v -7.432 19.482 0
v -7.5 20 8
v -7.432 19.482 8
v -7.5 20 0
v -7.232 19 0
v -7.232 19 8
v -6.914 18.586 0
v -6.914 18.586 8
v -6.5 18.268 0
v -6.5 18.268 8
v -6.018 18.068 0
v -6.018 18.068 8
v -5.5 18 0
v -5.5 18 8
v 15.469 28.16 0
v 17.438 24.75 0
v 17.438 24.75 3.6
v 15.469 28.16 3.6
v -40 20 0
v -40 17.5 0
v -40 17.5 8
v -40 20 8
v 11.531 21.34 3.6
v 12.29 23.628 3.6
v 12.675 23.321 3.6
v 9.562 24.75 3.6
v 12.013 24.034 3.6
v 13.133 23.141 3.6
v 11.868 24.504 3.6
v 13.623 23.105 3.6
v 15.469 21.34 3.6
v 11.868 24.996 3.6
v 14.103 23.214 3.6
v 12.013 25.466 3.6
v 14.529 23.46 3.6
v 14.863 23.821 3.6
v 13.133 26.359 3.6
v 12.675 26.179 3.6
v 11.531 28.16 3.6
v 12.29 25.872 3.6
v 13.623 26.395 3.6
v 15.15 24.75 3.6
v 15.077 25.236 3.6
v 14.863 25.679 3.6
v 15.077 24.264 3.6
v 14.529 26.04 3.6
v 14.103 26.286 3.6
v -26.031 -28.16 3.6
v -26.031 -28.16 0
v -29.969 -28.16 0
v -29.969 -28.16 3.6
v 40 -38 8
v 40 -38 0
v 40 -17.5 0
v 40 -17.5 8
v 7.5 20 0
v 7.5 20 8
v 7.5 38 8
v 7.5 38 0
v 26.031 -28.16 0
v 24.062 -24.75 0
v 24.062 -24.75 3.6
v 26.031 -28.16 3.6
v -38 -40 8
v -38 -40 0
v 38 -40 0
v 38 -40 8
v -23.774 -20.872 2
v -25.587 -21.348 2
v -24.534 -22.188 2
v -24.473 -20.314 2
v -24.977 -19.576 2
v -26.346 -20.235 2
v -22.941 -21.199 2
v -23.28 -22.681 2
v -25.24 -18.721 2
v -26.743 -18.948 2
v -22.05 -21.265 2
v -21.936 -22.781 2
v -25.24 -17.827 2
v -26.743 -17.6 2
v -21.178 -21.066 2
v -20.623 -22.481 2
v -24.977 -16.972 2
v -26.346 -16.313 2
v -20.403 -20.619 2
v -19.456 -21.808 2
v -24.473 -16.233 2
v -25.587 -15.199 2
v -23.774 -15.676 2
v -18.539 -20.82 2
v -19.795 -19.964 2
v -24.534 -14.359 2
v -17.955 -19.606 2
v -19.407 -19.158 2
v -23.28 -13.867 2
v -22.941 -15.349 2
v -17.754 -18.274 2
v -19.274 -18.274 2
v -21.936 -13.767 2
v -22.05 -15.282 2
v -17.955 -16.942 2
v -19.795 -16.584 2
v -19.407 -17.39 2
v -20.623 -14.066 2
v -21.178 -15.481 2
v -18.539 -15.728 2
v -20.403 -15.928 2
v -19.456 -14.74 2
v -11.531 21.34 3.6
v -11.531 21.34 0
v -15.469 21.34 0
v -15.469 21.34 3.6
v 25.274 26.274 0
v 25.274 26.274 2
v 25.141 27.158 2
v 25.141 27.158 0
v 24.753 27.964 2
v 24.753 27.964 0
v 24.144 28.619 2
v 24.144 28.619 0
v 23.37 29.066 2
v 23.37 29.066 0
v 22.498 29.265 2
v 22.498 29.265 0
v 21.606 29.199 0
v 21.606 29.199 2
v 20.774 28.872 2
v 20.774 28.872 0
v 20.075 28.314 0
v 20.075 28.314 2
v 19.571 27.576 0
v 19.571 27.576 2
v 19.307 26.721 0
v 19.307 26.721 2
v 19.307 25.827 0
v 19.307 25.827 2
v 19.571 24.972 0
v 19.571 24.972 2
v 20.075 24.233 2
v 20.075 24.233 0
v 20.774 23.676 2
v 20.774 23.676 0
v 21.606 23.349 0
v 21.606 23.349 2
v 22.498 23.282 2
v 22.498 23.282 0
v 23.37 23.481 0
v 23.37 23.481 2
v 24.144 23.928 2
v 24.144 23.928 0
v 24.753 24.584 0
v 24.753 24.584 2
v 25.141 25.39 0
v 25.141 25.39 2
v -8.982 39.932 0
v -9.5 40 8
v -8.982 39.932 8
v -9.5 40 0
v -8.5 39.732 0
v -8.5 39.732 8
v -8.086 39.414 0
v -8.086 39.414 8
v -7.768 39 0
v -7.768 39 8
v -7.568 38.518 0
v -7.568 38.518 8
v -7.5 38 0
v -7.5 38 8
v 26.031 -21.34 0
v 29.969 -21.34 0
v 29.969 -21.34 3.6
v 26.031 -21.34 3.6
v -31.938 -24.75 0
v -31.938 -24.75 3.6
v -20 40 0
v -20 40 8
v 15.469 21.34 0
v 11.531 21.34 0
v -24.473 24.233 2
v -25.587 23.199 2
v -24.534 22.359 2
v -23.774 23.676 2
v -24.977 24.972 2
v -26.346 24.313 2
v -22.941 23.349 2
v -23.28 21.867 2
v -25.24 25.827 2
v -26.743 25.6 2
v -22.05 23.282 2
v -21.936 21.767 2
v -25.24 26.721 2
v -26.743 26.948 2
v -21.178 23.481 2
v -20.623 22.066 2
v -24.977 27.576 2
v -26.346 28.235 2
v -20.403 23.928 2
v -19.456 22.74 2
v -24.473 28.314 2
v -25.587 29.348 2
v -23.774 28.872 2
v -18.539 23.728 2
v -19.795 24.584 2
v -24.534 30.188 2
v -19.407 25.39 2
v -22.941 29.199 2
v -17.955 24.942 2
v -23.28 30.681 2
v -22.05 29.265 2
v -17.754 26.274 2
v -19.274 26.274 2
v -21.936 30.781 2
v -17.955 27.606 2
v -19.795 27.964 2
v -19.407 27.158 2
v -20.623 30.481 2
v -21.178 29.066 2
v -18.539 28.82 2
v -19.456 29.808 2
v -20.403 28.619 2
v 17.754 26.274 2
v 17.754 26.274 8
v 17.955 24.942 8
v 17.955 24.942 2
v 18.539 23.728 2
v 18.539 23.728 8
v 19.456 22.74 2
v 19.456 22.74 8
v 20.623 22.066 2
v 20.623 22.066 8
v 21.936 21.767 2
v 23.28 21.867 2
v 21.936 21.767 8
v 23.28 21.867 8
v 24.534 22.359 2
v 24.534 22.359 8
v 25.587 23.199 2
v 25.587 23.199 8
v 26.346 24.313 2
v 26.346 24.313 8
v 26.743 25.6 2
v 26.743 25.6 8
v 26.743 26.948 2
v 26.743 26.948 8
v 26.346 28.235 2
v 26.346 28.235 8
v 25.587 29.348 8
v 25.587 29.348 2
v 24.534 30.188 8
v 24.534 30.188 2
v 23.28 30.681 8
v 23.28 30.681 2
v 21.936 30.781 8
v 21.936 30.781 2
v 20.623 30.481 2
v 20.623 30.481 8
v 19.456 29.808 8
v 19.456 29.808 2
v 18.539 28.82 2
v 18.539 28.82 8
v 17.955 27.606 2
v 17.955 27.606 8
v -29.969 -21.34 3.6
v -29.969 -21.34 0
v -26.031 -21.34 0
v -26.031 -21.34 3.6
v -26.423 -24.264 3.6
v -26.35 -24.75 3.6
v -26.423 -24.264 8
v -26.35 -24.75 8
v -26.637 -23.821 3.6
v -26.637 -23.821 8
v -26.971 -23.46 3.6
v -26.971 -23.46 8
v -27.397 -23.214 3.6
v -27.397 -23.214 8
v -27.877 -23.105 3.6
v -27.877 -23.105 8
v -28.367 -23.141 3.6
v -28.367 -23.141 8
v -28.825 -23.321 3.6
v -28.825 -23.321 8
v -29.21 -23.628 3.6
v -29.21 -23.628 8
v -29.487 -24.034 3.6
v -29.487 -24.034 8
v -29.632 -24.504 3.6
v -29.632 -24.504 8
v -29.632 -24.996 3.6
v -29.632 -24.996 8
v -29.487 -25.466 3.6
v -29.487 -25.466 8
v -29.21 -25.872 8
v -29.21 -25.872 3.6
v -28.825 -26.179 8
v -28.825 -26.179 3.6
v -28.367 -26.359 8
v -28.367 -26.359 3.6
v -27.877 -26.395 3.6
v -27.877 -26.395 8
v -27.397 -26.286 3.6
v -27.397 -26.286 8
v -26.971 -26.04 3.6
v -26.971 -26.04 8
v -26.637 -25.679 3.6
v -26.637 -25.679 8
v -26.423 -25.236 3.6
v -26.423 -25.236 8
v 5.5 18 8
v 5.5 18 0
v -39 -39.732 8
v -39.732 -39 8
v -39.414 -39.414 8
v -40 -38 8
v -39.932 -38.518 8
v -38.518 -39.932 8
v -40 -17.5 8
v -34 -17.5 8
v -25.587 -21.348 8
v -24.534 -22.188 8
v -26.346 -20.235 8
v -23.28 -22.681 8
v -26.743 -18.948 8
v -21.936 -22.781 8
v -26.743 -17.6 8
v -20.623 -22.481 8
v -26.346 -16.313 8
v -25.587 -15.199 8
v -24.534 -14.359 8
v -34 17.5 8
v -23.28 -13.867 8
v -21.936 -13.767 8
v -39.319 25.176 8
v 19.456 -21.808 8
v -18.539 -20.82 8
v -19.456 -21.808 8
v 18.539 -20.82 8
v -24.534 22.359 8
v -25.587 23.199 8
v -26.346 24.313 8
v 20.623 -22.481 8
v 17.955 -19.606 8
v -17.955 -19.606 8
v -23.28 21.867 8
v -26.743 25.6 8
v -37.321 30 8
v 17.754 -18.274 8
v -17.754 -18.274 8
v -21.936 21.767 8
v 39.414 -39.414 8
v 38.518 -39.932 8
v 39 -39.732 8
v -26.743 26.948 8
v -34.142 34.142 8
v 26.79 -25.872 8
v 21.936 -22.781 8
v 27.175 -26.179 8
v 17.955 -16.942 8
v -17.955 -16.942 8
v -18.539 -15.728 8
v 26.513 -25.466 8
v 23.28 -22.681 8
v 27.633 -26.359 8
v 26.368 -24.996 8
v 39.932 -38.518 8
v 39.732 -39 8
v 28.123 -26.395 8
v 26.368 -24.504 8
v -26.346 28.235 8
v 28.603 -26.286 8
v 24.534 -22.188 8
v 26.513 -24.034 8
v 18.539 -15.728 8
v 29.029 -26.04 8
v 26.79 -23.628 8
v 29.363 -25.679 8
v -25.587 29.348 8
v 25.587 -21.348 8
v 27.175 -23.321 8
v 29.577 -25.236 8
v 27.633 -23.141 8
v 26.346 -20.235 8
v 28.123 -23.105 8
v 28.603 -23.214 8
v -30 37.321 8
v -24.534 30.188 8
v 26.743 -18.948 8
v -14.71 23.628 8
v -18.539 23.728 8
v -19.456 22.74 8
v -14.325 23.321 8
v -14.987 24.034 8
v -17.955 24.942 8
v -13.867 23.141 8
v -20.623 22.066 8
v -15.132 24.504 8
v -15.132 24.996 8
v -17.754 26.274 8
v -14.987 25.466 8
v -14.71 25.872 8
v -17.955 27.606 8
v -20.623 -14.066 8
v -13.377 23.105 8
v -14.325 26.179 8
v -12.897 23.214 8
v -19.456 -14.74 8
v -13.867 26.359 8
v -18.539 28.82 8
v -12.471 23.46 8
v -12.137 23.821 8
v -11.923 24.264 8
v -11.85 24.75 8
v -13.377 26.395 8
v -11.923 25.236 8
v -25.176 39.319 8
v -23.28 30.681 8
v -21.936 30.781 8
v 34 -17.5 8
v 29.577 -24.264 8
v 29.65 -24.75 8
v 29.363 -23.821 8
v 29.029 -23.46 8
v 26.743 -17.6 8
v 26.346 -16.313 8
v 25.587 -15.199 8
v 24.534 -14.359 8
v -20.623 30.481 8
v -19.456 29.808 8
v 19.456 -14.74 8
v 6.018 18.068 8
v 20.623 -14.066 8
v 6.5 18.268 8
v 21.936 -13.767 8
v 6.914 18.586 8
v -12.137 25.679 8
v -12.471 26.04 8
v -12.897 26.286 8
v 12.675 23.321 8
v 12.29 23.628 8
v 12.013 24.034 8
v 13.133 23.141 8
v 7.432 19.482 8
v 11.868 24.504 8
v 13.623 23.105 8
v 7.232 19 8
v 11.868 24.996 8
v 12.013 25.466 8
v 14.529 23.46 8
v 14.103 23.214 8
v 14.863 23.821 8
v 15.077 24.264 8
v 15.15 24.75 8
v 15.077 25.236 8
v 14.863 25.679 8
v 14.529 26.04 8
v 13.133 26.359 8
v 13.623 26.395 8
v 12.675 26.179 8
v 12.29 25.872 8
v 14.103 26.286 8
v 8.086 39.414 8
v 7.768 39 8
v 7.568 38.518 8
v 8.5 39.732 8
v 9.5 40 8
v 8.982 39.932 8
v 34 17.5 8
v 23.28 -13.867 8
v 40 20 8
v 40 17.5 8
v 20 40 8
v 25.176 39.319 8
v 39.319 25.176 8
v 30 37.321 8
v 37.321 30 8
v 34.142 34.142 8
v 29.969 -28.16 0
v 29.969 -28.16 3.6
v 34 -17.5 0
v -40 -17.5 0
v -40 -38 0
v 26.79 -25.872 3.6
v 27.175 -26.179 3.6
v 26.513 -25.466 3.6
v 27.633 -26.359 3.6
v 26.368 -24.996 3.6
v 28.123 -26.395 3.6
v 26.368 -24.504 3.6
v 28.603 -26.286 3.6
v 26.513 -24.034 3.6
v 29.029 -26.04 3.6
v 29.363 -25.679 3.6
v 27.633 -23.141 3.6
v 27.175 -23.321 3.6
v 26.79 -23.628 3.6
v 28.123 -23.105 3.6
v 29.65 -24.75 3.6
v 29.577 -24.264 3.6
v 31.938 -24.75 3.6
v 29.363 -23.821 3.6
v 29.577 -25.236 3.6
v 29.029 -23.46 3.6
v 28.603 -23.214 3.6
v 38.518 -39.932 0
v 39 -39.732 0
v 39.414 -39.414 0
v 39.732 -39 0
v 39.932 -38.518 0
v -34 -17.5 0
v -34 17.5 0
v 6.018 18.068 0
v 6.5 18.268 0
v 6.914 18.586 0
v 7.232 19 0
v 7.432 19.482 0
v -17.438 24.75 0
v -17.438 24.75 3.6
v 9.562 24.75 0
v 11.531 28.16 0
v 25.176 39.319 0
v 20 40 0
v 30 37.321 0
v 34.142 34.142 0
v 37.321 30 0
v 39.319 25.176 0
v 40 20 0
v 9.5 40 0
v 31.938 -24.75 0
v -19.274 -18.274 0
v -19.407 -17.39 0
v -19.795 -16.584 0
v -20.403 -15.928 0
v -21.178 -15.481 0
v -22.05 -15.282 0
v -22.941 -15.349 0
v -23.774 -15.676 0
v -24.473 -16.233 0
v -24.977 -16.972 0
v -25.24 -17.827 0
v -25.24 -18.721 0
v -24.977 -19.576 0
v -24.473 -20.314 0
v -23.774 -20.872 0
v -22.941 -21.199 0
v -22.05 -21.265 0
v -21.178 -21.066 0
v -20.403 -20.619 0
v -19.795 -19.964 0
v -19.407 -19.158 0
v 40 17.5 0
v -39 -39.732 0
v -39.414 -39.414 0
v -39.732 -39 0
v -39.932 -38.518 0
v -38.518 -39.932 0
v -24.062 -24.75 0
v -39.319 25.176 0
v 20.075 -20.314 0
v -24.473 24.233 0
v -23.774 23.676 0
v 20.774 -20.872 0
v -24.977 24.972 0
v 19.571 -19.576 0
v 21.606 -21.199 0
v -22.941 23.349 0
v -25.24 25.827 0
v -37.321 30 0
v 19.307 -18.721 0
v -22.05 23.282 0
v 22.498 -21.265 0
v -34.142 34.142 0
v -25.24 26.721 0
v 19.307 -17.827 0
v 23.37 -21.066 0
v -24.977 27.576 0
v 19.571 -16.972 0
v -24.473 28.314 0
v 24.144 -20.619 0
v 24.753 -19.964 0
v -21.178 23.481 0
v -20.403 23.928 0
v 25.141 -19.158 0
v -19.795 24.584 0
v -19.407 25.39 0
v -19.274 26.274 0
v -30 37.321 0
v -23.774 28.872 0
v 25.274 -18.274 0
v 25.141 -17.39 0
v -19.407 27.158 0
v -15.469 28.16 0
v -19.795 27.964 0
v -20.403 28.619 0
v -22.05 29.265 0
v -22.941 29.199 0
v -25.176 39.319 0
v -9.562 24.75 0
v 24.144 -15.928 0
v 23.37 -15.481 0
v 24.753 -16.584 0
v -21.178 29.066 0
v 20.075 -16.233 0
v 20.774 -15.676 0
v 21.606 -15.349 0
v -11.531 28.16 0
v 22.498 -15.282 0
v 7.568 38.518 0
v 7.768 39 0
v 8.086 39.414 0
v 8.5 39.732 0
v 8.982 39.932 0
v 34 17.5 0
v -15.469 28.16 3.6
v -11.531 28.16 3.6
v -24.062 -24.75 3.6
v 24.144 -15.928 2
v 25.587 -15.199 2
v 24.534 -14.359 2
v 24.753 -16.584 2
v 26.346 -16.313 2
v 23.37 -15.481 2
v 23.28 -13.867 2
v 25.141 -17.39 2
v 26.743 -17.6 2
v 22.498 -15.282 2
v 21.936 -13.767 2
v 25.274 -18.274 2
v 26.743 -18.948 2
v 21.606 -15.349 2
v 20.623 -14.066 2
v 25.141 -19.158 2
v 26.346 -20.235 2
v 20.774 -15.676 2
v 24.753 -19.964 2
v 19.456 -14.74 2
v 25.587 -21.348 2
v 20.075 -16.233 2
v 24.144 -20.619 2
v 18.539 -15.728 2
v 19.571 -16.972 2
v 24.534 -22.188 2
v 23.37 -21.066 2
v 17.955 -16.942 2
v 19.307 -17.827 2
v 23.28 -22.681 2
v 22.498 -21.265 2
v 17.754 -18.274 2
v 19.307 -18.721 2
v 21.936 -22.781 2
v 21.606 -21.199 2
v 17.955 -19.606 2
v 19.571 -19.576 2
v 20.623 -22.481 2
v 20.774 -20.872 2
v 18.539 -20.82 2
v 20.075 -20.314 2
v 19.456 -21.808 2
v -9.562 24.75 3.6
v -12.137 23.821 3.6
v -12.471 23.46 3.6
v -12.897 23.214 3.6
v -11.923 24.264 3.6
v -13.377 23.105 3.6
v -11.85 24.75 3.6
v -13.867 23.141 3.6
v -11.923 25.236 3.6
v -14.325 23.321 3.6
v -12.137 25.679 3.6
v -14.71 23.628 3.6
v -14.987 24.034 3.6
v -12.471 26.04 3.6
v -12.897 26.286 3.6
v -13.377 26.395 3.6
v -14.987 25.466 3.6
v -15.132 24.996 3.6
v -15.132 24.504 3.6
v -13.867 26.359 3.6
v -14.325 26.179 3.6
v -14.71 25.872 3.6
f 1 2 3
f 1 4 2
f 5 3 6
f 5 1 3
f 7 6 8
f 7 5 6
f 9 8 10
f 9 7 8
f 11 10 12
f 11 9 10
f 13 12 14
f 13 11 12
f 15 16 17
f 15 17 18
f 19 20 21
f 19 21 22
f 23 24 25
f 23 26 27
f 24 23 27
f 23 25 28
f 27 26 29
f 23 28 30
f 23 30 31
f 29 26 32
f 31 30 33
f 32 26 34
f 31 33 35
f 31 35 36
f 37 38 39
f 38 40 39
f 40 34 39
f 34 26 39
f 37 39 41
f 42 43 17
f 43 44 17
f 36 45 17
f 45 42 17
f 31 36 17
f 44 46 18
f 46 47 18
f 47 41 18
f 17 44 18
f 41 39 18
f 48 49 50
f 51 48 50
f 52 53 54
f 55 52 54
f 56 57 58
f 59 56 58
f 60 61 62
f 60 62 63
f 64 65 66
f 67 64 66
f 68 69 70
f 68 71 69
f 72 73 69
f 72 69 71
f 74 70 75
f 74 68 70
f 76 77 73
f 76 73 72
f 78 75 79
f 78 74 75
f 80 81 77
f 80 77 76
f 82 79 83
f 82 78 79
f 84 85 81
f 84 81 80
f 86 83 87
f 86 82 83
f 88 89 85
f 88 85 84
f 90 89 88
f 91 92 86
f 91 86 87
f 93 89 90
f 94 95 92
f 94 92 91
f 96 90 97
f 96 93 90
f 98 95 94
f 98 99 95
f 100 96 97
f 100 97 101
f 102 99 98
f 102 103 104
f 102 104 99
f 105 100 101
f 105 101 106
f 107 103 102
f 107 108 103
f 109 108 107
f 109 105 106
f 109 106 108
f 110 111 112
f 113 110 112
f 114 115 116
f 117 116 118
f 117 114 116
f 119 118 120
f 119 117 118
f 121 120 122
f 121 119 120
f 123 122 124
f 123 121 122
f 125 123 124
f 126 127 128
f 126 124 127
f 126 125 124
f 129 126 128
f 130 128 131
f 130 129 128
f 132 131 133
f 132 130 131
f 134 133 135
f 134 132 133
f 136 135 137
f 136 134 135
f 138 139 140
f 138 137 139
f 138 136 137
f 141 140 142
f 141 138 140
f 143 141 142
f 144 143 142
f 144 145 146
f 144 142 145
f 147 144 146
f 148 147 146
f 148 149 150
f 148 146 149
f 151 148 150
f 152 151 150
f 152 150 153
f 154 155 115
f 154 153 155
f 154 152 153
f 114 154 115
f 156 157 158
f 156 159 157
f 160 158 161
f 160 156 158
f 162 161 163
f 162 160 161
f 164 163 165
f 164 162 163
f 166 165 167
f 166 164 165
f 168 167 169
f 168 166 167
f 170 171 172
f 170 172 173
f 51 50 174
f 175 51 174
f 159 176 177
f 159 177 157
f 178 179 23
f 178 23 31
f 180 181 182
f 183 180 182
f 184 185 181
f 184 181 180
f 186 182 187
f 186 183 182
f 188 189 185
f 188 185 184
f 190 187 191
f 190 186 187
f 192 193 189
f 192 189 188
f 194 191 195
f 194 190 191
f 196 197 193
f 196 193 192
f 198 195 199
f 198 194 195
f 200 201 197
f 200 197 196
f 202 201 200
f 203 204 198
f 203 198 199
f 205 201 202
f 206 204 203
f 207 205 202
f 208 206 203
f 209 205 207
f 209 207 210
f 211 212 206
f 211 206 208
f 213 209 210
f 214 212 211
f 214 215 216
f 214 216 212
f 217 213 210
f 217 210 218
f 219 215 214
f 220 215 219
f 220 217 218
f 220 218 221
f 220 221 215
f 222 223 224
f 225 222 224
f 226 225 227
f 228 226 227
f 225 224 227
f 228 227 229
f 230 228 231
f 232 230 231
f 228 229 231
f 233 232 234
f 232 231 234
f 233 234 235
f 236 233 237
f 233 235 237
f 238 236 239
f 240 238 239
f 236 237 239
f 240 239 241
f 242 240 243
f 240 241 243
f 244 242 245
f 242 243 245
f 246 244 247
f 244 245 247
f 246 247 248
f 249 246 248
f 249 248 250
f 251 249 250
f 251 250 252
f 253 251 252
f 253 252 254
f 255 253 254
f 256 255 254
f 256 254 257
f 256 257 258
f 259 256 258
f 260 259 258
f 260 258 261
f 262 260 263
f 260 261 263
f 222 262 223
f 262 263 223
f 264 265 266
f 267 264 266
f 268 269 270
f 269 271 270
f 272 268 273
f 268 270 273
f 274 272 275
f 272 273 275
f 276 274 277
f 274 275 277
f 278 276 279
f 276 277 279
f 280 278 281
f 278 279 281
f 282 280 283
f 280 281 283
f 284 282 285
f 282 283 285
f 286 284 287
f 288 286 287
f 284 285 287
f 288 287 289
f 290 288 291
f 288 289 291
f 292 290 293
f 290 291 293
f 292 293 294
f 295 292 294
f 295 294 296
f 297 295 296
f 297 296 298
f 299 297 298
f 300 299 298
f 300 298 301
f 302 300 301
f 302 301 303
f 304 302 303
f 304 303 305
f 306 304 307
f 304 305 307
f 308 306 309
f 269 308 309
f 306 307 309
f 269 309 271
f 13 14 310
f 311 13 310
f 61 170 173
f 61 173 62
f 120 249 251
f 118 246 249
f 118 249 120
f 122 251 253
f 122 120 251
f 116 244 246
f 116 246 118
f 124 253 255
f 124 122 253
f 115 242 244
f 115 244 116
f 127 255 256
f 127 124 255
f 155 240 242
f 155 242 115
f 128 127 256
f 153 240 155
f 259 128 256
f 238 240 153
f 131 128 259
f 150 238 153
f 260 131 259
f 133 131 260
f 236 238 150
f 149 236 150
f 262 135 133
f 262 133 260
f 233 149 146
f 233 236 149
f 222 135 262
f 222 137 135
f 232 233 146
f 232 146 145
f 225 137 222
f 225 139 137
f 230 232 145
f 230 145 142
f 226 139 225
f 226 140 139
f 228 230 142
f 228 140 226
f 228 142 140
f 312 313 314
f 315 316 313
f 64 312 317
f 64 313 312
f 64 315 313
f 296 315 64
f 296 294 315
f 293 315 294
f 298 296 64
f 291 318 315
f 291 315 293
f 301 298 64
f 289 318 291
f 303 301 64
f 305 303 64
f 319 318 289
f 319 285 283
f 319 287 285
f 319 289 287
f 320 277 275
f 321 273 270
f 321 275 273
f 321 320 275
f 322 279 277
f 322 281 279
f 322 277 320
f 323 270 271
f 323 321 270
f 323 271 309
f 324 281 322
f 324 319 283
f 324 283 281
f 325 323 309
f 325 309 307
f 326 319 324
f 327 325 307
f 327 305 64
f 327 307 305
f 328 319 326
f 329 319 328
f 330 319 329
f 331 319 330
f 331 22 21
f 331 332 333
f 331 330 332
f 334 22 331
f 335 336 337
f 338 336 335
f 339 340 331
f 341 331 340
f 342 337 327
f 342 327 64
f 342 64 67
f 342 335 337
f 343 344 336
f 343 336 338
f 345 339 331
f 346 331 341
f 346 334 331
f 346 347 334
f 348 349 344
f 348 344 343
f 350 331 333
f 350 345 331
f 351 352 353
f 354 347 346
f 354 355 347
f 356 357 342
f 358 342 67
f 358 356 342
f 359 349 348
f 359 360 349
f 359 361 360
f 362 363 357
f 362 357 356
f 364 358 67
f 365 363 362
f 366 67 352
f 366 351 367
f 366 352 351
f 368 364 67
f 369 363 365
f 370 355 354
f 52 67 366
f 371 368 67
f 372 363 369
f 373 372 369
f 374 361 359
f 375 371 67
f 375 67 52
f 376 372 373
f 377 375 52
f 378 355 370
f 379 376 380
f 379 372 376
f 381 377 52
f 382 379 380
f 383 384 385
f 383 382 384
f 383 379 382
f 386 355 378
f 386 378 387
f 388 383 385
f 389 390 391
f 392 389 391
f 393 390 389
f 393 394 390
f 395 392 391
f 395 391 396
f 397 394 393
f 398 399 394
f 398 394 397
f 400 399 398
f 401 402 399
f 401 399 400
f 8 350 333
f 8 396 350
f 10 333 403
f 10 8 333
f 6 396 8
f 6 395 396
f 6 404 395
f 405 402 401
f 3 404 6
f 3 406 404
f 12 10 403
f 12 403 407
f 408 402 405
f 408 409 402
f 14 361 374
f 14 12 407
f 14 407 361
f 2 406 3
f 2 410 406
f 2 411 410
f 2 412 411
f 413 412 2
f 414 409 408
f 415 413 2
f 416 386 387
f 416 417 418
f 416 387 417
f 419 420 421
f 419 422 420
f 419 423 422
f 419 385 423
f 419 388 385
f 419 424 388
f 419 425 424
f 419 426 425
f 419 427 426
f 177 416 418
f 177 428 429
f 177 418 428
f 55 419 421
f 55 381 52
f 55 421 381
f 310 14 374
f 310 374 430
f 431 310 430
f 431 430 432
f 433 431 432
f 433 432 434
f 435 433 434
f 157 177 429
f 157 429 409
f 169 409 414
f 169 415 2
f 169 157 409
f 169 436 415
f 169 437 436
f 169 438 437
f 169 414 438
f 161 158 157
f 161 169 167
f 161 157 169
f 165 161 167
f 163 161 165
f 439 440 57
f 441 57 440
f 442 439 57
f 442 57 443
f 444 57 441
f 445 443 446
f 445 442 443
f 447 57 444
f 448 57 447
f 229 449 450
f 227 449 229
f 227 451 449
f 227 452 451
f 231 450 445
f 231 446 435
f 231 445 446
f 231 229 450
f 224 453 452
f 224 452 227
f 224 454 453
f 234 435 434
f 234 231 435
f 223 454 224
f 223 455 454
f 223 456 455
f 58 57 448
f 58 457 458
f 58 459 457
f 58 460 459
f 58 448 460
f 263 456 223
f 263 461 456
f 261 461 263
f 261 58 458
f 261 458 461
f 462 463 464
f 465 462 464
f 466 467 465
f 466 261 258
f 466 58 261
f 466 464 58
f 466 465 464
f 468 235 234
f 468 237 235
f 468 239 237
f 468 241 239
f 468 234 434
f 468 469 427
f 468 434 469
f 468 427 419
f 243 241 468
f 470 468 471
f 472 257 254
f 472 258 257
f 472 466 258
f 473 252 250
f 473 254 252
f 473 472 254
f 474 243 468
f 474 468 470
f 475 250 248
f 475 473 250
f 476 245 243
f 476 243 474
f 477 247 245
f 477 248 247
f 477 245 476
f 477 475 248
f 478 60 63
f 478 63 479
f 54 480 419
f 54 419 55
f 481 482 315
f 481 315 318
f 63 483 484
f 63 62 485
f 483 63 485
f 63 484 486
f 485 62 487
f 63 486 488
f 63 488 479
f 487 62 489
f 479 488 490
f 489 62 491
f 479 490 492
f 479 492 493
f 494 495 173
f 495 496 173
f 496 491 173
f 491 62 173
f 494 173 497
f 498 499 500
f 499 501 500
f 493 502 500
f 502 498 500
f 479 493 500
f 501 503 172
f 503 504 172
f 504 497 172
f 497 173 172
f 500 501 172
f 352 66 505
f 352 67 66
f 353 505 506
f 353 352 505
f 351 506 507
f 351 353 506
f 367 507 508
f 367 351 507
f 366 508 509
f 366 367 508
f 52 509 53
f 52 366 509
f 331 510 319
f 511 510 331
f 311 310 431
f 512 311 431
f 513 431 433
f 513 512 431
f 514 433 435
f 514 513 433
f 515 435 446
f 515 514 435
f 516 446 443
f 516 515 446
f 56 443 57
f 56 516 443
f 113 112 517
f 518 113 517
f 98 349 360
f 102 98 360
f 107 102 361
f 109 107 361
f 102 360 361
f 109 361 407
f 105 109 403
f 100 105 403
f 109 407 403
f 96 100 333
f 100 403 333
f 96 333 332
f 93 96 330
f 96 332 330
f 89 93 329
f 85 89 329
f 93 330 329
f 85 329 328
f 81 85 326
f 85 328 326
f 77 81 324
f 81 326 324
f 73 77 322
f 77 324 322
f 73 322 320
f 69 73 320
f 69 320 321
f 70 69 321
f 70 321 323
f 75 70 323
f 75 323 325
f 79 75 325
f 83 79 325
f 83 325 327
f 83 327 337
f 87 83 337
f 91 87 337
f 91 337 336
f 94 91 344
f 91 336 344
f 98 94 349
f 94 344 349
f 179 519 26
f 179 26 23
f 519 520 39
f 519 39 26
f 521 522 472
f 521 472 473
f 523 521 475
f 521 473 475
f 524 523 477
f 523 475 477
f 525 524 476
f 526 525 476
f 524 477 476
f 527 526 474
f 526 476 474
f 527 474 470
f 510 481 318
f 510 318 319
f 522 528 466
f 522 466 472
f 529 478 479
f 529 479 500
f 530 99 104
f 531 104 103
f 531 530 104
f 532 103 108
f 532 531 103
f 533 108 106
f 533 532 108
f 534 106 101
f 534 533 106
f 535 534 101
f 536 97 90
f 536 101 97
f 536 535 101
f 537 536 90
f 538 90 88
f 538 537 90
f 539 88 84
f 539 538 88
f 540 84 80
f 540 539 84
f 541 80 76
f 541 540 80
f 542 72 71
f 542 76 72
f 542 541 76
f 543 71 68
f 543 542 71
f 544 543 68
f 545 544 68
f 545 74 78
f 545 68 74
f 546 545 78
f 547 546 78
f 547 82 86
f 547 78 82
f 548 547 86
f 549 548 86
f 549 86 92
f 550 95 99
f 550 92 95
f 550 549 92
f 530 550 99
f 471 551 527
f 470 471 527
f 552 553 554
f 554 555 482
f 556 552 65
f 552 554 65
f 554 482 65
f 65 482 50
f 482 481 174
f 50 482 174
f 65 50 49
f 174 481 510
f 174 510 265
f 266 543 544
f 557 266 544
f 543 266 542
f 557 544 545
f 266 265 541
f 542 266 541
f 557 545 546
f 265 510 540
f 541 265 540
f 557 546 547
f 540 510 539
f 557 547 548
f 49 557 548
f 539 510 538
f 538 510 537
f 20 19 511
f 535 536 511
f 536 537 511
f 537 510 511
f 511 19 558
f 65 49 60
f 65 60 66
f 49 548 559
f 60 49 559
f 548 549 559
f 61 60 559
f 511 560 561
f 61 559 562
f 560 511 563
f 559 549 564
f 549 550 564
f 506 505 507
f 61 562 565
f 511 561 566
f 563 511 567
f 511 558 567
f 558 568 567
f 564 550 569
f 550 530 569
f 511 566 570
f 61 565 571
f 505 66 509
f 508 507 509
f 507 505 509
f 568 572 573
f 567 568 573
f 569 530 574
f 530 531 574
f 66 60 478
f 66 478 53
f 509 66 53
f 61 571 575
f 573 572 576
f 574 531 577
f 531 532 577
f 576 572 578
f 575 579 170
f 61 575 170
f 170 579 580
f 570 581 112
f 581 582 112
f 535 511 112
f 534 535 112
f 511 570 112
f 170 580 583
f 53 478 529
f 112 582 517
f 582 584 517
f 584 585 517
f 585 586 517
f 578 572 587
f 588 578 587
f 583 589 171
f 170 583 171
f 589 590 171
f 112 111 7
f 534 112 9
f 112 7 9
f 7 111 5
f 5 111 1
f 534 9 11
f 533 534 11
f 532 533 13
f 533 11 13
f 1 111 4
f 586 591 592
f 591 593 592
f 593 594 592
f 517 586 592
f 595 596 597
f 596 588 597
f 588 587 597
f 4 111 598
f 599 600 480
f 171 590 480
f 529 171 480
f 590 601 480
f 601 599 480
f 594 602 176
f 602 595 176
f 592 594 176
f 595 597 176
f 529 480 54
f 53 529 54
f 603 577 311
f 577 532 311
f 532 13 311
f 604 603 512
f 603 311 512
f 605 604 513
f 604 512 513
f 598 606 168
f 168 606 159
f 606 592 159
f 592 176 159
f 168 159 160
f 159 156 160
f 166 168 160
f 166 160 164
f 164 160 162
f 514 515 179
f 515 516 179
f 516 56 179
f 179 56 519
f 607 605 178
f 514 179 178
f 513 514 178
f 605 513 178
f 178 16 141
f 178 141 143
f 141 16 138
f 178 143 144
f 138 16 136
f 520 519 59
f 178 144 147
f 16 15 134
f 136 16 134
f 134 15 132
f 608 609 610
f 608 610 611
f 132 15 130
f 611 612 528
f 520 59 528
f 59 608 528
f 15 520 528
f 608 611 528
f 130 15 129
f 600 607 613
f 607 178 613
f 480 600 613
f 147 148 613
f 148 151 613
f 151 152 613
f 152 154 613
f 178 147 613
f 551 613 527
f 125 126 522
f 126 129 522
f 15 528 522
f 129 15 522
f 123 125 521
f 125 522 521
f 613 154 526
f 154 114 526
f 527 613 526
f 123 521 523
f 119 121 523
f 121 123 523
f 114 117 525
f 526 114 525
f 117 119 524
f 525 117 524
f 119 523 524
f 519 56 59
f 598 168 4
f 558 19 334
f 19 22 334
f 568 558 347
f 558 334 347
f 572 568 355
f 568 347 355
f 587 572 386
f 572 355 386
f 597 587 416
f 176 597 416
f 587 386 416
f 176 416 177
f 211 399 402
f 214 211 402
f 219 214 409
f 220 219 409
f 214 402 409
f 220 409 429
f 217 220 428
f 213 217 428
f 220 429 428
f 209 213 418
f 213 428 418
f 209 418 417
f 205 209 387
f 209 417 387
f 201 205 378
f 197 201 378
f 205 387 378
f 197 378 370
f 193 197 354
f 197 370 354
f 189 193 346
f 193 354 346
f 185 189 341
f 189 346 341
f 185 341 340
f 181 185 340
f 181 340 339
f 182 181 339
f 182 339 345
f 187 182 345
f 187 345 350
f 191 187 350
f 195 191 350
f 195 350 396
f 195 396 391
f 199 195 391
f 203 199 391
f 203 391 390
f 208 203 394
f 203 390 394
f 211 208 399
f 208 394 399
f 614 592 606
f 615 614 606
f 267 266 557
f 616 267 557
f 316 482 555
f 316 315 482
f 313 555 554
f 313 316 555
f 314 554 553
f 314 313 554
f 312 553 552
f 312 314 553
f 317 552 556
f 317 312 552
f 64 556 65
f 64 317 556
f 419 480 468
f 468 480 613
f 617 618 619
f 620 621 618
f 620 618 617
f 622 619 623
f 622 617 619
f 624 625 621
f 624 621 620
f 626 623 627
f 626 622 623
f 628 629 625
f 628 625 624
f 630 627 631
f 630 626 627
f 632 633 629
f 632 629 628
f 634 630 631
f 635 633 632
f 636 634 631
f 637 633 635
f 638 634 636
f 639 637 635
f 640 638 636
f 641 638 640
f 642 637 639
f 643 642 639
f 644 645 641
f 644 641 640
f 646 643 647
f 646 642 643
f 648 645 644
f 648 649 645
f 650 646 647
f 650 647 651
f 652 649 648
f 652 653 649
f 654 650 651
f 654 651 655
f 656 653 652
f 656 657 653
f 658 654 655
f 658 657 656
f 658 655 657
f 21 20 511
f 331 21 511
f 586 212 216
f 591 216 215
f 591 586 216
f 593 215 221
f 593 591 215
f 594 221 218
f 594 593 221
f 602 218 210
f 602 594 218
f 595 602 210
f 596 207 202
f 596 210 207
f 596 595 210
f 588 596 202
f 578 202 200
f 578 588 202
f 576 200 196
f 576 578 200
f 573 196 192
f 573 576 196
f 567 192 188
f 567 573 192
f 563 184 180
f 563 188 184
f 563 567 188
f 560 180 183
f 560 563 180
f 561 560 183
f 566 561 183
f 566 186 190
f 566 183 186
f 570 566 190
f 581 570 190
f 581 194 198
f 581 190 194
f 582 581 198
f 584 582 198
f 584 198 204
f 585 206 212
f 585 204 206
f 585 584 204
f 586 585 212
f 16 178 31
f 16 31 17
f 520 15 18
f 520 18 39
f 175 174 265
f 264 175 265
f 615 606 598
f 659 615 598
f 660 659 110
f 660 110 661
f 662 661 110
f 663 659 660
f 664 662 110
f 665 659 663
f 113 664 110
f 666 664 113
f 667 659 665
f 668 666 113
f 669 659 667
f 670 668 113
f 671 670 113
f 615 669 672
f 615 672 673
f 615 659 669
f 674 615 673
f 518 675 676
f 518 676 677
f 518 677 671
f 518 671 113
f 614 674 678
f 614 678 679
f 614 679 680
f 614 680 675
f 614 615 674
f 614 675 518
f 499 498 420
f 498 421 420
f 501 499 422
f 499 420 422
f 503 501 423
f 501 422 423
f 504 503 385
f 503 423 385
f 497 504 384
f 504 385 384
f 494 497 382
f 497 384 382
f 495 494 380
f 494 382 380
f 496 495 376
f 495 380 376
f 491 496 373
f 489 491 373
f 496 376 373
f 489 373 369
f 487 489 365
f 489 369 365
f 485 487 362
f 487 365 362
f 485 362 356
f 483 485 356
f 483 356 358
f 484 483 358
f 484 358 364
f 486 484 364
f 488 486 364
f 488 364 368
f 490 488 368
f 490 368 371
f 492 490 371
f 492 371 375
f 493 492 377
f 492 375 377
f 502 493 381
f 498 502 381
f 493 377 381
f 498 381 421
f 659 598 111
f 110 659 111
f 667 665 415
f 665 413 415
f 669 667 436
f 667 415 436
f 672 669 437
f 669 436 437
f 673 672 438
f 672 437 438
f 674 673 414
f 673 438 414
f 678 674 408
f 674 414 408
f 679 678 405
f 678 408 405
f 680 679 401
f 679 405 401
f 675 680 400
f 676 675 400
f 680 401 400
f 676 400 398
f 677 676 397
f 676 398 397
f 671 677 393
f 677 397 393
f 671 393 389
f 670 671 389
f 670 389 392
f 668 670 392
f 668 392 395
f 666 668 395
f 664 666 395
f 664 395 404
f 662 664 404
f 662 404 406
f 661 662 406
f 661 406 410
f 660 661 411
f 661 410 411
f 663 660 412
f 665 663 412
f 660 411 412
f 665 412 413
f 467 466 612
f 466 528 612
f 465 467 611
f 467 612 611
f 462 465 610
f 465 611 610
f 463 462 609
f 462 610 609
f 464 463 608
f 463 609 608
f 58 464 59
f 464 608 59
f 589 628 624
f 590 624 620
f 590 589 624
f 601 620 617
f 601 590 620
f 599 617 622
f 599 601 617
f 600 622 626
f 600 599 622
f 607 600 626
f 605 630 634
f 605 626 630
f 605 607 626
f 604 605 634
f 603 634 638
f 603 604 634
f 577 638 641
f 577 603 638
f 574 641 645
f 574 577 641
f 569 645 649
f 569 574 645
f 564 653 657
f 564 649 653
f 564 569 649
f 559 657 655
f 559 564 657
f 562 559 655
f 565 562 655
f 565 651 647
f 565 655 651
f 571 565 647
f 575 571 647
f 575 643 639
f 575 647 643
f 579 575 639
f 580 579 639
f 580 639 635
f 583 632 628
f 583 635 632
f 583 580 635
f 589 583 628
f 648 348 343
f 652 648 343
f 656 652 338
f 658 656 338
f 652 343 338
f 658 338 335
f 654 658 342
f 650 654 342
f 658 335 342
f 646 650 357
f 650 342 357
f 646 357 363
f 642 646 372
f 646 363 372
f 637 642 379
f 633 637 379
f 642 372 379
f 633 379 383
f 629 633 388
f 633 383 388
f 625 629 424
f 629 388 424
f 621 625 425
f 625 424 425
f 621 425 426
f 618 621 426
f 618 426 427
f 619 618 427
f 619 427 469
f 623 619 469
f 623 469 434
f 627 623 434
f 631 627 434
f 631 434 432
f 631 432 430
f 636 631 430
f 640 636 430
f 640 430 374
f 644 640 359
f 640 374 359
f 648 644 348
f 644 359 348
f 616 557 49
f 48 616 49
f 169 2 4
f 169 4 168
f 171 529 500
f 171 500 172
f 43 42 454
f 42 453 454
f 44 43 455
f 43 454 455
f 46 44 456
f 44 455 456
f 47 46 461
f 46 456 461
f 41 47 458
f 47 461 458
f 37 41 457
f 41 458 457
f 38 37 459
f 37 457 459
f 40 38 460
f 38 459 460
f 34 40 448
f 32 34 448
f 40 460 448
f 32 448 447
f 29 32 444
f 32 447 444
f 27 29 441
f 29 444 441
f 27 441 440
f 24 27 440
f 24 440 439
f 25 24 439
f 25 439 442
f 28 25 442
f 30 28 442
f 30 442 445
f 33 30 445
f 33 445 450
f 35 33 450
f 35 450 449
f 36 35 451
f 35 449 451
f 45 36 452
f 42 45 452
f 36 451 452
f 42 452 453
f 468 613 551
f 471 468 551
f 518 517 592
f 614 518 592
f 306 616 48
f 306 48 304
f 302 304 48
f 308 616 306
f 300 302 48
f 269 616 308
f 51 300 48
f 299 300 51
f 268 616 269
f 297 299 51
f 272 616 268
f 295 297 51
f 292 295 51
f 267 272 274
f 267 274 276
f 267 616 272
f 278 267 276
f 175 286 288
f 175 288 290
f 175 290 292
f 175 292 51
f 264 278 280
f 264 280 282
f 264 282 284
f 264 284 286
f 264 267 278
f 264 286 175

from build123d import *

# Parameters (mm, degrees)
SKETCH_1_W                   = 80
SKETCH_1_H                   = 80
EXTRUDE_1_DEPTH              = 8
SKETCH_7_W                   = 15
SKETCH_7_H                   = 22
CUT_EXTRUDE_1_DEPTH          = 10
HOLE_WIZARD_M4_1_D           = 3.3
HOLE_WIZARD_M4_1_CSINK_D     = 4.05
HOLE_WIZARD_M4_1_CSINK_ANGLE = 90
FILLET_1_R                   = 20
FILLET_2_R                   = 2
SKETCH_9_W                   = 6
SKETCH_9_H                   = 35
CUT_EXTRUDE_2_DEPTH          = 11
SKETCH_11_R                  = 3
CUT_EXTRUDE_4_DEPTH          = 15
CUT_EXTRUDE_5_DEPTH          = 3.6
SKETCH_13_R                  = 4.52
CUT_EXTRUDE_6_DEPTH          = 6


with BuildPart() as part:
    # 草图1 → 凸台-拉伸1 (new body)
    with BuildSketch(Plane.XY):
        Rectangle(SKETCH_1_W, SKETCH_1_H)
    extrude(amount=EXTRUDE_1_DEPTH)

    # 草图7 → 切除-拉伸1 (cut)
    with BuildSketch(Plane.XY.offset(8)):
        with Locations((0, 29)):
            Rectangle(SKETCH_7_W, SKETCH_7_H)
    extrude(amount=-CUT_EXTRUDE_1_DEPTH, mode=Mode.SUBTRACT)

    # M4 螺纹孔1 (through all)
    with Locations(Plane(origin=(13.5, 24.75, 0), x_dir=(-1, 0, 0), z_dir=(0, 0, -1))):
        with Locations((0, 0), (27, 0), (41.5, -49.5), (-14.5, -49.5)):
            CounterSinkHole(HOLE_WIZARD_M4_1_D / 2, HOLE_WIZARD_M4_1_CSINK_D / 2, counter_sink_angle=HOLE_WIZARD_M4_1_CSINK_ANGLE)

    # 圆角1
    fillet_1_edges = [part.edges().sort_by_distance(p)[0] for p in [
        (-40, 40, 4),
        (40, 40, 4),
    ]]
    fillet(fillet_1_edges, radius=FILLET_1_R)

    # 圆角2
    fillet_2_edges = [part.edges().sort_by_distance(p)[0] for p in [
        (-7.5, 18, 4),
        (-7.5, 40, 4),
        (7.5, 40, 4),
        (7.5, 18, 4),
        (40, -40, 4),
        (-40, -40, 4),
    ]]
    fillet(fillet_2_edges, radius=FILLET_2_R)

    # 草图9 → 切除-拉伸2 (cut)
    with BuildSketch(Plane.XY):
        with Locations((37, 0)):
            Rectangle(SKETCH_9_W, SKETCH_9_H)
        with Locations((-37, 0)):
            Rectangle(SKETCH_9_W, SKETCH_9_H)
    extrude(amount=CUT_EXTRUDE_2_DEPTH, mode=Mode.SUBTRACT)

    # 草图11 → 切除-拉伸4 (cut)
    with BuildSketch(Plane.XY):
        with Locations((-22.273863607, 26.273863607)):
            Circle(SKETCH_11_R)
        with Locations((22.273863607, 26.273863607)):
            Circle(SKETCH_11_R)
        with Locations((22.273863607, -18.273863607)):
            Circle(SKETCH_11_R)
        with Locations((-22.273863607, -18.273863607)):
            Circle(SKETCH_11_R)
    extrude(amount=CUT_EXTRUDE_4_DEPTH, mode=Mode.SUBTRACT)

    # 草图12 → 切除-拉伸5 (cut)
    with BuildSketch(Plane.XY):
        Polygon((11.531235582, 21.34), (15.468764418, 21.34), (17.437528836, 24.75), (15.468764418, 28.16), (11.531235582, 28.16), (9.562471164, 24.75), align=None)
        Polygon((26.031235582, -28.16), (29.968764418, -28.16), (31.937528836, -24.75), (29.968764418, -21.34), (26.031235582, -21.34), (24.062471164, -24.75), align=None)
        Polygon((-24.062471164, -24.75), (-26.031235582, -28.16), (-29.968764418, -28.16), (-31.937528836, -24.75), (-29.968764418, -21.34), (-26.031235582, -21.34), align=None)
        Polygon((-9.562471164, 24.75), (-11.531235582, 21.34), (-15.468764418, 21.34), (-17.437528836, 24.75), (-15.468764418, 28.16), (-11.531235582, 28.16), align=None)
    extrude(amount=CUT_EXTRUDE_5_DEPTH, mode=Mode.SUBTRACT)

    # 草图13 → 切除-拉伸6 (cut)
    with BuildSketch(Plane.XY.offset(8)):
        with Locations((-22.273863607, 26.273863607)):
            Circle(SKETCH_13_R)
        with Locations((-22.273863607, -18.273863607)):
            Circle(SKETCH_13_R)
        with Locations(Location((22.273863607, -18.273863607, 0), (0, 0, 180))):
            Circle(SKETCH_13_R)
        with Locations(Location((22.273863607, 26.273863607, 0), (0, 0, 180))):
            Circle(SKETCH_13_R)
    extrude(amount=-CUT_EXTRUDE_6_DEPTH, mode=Mode.SUBTRACT)


solid = part.part
